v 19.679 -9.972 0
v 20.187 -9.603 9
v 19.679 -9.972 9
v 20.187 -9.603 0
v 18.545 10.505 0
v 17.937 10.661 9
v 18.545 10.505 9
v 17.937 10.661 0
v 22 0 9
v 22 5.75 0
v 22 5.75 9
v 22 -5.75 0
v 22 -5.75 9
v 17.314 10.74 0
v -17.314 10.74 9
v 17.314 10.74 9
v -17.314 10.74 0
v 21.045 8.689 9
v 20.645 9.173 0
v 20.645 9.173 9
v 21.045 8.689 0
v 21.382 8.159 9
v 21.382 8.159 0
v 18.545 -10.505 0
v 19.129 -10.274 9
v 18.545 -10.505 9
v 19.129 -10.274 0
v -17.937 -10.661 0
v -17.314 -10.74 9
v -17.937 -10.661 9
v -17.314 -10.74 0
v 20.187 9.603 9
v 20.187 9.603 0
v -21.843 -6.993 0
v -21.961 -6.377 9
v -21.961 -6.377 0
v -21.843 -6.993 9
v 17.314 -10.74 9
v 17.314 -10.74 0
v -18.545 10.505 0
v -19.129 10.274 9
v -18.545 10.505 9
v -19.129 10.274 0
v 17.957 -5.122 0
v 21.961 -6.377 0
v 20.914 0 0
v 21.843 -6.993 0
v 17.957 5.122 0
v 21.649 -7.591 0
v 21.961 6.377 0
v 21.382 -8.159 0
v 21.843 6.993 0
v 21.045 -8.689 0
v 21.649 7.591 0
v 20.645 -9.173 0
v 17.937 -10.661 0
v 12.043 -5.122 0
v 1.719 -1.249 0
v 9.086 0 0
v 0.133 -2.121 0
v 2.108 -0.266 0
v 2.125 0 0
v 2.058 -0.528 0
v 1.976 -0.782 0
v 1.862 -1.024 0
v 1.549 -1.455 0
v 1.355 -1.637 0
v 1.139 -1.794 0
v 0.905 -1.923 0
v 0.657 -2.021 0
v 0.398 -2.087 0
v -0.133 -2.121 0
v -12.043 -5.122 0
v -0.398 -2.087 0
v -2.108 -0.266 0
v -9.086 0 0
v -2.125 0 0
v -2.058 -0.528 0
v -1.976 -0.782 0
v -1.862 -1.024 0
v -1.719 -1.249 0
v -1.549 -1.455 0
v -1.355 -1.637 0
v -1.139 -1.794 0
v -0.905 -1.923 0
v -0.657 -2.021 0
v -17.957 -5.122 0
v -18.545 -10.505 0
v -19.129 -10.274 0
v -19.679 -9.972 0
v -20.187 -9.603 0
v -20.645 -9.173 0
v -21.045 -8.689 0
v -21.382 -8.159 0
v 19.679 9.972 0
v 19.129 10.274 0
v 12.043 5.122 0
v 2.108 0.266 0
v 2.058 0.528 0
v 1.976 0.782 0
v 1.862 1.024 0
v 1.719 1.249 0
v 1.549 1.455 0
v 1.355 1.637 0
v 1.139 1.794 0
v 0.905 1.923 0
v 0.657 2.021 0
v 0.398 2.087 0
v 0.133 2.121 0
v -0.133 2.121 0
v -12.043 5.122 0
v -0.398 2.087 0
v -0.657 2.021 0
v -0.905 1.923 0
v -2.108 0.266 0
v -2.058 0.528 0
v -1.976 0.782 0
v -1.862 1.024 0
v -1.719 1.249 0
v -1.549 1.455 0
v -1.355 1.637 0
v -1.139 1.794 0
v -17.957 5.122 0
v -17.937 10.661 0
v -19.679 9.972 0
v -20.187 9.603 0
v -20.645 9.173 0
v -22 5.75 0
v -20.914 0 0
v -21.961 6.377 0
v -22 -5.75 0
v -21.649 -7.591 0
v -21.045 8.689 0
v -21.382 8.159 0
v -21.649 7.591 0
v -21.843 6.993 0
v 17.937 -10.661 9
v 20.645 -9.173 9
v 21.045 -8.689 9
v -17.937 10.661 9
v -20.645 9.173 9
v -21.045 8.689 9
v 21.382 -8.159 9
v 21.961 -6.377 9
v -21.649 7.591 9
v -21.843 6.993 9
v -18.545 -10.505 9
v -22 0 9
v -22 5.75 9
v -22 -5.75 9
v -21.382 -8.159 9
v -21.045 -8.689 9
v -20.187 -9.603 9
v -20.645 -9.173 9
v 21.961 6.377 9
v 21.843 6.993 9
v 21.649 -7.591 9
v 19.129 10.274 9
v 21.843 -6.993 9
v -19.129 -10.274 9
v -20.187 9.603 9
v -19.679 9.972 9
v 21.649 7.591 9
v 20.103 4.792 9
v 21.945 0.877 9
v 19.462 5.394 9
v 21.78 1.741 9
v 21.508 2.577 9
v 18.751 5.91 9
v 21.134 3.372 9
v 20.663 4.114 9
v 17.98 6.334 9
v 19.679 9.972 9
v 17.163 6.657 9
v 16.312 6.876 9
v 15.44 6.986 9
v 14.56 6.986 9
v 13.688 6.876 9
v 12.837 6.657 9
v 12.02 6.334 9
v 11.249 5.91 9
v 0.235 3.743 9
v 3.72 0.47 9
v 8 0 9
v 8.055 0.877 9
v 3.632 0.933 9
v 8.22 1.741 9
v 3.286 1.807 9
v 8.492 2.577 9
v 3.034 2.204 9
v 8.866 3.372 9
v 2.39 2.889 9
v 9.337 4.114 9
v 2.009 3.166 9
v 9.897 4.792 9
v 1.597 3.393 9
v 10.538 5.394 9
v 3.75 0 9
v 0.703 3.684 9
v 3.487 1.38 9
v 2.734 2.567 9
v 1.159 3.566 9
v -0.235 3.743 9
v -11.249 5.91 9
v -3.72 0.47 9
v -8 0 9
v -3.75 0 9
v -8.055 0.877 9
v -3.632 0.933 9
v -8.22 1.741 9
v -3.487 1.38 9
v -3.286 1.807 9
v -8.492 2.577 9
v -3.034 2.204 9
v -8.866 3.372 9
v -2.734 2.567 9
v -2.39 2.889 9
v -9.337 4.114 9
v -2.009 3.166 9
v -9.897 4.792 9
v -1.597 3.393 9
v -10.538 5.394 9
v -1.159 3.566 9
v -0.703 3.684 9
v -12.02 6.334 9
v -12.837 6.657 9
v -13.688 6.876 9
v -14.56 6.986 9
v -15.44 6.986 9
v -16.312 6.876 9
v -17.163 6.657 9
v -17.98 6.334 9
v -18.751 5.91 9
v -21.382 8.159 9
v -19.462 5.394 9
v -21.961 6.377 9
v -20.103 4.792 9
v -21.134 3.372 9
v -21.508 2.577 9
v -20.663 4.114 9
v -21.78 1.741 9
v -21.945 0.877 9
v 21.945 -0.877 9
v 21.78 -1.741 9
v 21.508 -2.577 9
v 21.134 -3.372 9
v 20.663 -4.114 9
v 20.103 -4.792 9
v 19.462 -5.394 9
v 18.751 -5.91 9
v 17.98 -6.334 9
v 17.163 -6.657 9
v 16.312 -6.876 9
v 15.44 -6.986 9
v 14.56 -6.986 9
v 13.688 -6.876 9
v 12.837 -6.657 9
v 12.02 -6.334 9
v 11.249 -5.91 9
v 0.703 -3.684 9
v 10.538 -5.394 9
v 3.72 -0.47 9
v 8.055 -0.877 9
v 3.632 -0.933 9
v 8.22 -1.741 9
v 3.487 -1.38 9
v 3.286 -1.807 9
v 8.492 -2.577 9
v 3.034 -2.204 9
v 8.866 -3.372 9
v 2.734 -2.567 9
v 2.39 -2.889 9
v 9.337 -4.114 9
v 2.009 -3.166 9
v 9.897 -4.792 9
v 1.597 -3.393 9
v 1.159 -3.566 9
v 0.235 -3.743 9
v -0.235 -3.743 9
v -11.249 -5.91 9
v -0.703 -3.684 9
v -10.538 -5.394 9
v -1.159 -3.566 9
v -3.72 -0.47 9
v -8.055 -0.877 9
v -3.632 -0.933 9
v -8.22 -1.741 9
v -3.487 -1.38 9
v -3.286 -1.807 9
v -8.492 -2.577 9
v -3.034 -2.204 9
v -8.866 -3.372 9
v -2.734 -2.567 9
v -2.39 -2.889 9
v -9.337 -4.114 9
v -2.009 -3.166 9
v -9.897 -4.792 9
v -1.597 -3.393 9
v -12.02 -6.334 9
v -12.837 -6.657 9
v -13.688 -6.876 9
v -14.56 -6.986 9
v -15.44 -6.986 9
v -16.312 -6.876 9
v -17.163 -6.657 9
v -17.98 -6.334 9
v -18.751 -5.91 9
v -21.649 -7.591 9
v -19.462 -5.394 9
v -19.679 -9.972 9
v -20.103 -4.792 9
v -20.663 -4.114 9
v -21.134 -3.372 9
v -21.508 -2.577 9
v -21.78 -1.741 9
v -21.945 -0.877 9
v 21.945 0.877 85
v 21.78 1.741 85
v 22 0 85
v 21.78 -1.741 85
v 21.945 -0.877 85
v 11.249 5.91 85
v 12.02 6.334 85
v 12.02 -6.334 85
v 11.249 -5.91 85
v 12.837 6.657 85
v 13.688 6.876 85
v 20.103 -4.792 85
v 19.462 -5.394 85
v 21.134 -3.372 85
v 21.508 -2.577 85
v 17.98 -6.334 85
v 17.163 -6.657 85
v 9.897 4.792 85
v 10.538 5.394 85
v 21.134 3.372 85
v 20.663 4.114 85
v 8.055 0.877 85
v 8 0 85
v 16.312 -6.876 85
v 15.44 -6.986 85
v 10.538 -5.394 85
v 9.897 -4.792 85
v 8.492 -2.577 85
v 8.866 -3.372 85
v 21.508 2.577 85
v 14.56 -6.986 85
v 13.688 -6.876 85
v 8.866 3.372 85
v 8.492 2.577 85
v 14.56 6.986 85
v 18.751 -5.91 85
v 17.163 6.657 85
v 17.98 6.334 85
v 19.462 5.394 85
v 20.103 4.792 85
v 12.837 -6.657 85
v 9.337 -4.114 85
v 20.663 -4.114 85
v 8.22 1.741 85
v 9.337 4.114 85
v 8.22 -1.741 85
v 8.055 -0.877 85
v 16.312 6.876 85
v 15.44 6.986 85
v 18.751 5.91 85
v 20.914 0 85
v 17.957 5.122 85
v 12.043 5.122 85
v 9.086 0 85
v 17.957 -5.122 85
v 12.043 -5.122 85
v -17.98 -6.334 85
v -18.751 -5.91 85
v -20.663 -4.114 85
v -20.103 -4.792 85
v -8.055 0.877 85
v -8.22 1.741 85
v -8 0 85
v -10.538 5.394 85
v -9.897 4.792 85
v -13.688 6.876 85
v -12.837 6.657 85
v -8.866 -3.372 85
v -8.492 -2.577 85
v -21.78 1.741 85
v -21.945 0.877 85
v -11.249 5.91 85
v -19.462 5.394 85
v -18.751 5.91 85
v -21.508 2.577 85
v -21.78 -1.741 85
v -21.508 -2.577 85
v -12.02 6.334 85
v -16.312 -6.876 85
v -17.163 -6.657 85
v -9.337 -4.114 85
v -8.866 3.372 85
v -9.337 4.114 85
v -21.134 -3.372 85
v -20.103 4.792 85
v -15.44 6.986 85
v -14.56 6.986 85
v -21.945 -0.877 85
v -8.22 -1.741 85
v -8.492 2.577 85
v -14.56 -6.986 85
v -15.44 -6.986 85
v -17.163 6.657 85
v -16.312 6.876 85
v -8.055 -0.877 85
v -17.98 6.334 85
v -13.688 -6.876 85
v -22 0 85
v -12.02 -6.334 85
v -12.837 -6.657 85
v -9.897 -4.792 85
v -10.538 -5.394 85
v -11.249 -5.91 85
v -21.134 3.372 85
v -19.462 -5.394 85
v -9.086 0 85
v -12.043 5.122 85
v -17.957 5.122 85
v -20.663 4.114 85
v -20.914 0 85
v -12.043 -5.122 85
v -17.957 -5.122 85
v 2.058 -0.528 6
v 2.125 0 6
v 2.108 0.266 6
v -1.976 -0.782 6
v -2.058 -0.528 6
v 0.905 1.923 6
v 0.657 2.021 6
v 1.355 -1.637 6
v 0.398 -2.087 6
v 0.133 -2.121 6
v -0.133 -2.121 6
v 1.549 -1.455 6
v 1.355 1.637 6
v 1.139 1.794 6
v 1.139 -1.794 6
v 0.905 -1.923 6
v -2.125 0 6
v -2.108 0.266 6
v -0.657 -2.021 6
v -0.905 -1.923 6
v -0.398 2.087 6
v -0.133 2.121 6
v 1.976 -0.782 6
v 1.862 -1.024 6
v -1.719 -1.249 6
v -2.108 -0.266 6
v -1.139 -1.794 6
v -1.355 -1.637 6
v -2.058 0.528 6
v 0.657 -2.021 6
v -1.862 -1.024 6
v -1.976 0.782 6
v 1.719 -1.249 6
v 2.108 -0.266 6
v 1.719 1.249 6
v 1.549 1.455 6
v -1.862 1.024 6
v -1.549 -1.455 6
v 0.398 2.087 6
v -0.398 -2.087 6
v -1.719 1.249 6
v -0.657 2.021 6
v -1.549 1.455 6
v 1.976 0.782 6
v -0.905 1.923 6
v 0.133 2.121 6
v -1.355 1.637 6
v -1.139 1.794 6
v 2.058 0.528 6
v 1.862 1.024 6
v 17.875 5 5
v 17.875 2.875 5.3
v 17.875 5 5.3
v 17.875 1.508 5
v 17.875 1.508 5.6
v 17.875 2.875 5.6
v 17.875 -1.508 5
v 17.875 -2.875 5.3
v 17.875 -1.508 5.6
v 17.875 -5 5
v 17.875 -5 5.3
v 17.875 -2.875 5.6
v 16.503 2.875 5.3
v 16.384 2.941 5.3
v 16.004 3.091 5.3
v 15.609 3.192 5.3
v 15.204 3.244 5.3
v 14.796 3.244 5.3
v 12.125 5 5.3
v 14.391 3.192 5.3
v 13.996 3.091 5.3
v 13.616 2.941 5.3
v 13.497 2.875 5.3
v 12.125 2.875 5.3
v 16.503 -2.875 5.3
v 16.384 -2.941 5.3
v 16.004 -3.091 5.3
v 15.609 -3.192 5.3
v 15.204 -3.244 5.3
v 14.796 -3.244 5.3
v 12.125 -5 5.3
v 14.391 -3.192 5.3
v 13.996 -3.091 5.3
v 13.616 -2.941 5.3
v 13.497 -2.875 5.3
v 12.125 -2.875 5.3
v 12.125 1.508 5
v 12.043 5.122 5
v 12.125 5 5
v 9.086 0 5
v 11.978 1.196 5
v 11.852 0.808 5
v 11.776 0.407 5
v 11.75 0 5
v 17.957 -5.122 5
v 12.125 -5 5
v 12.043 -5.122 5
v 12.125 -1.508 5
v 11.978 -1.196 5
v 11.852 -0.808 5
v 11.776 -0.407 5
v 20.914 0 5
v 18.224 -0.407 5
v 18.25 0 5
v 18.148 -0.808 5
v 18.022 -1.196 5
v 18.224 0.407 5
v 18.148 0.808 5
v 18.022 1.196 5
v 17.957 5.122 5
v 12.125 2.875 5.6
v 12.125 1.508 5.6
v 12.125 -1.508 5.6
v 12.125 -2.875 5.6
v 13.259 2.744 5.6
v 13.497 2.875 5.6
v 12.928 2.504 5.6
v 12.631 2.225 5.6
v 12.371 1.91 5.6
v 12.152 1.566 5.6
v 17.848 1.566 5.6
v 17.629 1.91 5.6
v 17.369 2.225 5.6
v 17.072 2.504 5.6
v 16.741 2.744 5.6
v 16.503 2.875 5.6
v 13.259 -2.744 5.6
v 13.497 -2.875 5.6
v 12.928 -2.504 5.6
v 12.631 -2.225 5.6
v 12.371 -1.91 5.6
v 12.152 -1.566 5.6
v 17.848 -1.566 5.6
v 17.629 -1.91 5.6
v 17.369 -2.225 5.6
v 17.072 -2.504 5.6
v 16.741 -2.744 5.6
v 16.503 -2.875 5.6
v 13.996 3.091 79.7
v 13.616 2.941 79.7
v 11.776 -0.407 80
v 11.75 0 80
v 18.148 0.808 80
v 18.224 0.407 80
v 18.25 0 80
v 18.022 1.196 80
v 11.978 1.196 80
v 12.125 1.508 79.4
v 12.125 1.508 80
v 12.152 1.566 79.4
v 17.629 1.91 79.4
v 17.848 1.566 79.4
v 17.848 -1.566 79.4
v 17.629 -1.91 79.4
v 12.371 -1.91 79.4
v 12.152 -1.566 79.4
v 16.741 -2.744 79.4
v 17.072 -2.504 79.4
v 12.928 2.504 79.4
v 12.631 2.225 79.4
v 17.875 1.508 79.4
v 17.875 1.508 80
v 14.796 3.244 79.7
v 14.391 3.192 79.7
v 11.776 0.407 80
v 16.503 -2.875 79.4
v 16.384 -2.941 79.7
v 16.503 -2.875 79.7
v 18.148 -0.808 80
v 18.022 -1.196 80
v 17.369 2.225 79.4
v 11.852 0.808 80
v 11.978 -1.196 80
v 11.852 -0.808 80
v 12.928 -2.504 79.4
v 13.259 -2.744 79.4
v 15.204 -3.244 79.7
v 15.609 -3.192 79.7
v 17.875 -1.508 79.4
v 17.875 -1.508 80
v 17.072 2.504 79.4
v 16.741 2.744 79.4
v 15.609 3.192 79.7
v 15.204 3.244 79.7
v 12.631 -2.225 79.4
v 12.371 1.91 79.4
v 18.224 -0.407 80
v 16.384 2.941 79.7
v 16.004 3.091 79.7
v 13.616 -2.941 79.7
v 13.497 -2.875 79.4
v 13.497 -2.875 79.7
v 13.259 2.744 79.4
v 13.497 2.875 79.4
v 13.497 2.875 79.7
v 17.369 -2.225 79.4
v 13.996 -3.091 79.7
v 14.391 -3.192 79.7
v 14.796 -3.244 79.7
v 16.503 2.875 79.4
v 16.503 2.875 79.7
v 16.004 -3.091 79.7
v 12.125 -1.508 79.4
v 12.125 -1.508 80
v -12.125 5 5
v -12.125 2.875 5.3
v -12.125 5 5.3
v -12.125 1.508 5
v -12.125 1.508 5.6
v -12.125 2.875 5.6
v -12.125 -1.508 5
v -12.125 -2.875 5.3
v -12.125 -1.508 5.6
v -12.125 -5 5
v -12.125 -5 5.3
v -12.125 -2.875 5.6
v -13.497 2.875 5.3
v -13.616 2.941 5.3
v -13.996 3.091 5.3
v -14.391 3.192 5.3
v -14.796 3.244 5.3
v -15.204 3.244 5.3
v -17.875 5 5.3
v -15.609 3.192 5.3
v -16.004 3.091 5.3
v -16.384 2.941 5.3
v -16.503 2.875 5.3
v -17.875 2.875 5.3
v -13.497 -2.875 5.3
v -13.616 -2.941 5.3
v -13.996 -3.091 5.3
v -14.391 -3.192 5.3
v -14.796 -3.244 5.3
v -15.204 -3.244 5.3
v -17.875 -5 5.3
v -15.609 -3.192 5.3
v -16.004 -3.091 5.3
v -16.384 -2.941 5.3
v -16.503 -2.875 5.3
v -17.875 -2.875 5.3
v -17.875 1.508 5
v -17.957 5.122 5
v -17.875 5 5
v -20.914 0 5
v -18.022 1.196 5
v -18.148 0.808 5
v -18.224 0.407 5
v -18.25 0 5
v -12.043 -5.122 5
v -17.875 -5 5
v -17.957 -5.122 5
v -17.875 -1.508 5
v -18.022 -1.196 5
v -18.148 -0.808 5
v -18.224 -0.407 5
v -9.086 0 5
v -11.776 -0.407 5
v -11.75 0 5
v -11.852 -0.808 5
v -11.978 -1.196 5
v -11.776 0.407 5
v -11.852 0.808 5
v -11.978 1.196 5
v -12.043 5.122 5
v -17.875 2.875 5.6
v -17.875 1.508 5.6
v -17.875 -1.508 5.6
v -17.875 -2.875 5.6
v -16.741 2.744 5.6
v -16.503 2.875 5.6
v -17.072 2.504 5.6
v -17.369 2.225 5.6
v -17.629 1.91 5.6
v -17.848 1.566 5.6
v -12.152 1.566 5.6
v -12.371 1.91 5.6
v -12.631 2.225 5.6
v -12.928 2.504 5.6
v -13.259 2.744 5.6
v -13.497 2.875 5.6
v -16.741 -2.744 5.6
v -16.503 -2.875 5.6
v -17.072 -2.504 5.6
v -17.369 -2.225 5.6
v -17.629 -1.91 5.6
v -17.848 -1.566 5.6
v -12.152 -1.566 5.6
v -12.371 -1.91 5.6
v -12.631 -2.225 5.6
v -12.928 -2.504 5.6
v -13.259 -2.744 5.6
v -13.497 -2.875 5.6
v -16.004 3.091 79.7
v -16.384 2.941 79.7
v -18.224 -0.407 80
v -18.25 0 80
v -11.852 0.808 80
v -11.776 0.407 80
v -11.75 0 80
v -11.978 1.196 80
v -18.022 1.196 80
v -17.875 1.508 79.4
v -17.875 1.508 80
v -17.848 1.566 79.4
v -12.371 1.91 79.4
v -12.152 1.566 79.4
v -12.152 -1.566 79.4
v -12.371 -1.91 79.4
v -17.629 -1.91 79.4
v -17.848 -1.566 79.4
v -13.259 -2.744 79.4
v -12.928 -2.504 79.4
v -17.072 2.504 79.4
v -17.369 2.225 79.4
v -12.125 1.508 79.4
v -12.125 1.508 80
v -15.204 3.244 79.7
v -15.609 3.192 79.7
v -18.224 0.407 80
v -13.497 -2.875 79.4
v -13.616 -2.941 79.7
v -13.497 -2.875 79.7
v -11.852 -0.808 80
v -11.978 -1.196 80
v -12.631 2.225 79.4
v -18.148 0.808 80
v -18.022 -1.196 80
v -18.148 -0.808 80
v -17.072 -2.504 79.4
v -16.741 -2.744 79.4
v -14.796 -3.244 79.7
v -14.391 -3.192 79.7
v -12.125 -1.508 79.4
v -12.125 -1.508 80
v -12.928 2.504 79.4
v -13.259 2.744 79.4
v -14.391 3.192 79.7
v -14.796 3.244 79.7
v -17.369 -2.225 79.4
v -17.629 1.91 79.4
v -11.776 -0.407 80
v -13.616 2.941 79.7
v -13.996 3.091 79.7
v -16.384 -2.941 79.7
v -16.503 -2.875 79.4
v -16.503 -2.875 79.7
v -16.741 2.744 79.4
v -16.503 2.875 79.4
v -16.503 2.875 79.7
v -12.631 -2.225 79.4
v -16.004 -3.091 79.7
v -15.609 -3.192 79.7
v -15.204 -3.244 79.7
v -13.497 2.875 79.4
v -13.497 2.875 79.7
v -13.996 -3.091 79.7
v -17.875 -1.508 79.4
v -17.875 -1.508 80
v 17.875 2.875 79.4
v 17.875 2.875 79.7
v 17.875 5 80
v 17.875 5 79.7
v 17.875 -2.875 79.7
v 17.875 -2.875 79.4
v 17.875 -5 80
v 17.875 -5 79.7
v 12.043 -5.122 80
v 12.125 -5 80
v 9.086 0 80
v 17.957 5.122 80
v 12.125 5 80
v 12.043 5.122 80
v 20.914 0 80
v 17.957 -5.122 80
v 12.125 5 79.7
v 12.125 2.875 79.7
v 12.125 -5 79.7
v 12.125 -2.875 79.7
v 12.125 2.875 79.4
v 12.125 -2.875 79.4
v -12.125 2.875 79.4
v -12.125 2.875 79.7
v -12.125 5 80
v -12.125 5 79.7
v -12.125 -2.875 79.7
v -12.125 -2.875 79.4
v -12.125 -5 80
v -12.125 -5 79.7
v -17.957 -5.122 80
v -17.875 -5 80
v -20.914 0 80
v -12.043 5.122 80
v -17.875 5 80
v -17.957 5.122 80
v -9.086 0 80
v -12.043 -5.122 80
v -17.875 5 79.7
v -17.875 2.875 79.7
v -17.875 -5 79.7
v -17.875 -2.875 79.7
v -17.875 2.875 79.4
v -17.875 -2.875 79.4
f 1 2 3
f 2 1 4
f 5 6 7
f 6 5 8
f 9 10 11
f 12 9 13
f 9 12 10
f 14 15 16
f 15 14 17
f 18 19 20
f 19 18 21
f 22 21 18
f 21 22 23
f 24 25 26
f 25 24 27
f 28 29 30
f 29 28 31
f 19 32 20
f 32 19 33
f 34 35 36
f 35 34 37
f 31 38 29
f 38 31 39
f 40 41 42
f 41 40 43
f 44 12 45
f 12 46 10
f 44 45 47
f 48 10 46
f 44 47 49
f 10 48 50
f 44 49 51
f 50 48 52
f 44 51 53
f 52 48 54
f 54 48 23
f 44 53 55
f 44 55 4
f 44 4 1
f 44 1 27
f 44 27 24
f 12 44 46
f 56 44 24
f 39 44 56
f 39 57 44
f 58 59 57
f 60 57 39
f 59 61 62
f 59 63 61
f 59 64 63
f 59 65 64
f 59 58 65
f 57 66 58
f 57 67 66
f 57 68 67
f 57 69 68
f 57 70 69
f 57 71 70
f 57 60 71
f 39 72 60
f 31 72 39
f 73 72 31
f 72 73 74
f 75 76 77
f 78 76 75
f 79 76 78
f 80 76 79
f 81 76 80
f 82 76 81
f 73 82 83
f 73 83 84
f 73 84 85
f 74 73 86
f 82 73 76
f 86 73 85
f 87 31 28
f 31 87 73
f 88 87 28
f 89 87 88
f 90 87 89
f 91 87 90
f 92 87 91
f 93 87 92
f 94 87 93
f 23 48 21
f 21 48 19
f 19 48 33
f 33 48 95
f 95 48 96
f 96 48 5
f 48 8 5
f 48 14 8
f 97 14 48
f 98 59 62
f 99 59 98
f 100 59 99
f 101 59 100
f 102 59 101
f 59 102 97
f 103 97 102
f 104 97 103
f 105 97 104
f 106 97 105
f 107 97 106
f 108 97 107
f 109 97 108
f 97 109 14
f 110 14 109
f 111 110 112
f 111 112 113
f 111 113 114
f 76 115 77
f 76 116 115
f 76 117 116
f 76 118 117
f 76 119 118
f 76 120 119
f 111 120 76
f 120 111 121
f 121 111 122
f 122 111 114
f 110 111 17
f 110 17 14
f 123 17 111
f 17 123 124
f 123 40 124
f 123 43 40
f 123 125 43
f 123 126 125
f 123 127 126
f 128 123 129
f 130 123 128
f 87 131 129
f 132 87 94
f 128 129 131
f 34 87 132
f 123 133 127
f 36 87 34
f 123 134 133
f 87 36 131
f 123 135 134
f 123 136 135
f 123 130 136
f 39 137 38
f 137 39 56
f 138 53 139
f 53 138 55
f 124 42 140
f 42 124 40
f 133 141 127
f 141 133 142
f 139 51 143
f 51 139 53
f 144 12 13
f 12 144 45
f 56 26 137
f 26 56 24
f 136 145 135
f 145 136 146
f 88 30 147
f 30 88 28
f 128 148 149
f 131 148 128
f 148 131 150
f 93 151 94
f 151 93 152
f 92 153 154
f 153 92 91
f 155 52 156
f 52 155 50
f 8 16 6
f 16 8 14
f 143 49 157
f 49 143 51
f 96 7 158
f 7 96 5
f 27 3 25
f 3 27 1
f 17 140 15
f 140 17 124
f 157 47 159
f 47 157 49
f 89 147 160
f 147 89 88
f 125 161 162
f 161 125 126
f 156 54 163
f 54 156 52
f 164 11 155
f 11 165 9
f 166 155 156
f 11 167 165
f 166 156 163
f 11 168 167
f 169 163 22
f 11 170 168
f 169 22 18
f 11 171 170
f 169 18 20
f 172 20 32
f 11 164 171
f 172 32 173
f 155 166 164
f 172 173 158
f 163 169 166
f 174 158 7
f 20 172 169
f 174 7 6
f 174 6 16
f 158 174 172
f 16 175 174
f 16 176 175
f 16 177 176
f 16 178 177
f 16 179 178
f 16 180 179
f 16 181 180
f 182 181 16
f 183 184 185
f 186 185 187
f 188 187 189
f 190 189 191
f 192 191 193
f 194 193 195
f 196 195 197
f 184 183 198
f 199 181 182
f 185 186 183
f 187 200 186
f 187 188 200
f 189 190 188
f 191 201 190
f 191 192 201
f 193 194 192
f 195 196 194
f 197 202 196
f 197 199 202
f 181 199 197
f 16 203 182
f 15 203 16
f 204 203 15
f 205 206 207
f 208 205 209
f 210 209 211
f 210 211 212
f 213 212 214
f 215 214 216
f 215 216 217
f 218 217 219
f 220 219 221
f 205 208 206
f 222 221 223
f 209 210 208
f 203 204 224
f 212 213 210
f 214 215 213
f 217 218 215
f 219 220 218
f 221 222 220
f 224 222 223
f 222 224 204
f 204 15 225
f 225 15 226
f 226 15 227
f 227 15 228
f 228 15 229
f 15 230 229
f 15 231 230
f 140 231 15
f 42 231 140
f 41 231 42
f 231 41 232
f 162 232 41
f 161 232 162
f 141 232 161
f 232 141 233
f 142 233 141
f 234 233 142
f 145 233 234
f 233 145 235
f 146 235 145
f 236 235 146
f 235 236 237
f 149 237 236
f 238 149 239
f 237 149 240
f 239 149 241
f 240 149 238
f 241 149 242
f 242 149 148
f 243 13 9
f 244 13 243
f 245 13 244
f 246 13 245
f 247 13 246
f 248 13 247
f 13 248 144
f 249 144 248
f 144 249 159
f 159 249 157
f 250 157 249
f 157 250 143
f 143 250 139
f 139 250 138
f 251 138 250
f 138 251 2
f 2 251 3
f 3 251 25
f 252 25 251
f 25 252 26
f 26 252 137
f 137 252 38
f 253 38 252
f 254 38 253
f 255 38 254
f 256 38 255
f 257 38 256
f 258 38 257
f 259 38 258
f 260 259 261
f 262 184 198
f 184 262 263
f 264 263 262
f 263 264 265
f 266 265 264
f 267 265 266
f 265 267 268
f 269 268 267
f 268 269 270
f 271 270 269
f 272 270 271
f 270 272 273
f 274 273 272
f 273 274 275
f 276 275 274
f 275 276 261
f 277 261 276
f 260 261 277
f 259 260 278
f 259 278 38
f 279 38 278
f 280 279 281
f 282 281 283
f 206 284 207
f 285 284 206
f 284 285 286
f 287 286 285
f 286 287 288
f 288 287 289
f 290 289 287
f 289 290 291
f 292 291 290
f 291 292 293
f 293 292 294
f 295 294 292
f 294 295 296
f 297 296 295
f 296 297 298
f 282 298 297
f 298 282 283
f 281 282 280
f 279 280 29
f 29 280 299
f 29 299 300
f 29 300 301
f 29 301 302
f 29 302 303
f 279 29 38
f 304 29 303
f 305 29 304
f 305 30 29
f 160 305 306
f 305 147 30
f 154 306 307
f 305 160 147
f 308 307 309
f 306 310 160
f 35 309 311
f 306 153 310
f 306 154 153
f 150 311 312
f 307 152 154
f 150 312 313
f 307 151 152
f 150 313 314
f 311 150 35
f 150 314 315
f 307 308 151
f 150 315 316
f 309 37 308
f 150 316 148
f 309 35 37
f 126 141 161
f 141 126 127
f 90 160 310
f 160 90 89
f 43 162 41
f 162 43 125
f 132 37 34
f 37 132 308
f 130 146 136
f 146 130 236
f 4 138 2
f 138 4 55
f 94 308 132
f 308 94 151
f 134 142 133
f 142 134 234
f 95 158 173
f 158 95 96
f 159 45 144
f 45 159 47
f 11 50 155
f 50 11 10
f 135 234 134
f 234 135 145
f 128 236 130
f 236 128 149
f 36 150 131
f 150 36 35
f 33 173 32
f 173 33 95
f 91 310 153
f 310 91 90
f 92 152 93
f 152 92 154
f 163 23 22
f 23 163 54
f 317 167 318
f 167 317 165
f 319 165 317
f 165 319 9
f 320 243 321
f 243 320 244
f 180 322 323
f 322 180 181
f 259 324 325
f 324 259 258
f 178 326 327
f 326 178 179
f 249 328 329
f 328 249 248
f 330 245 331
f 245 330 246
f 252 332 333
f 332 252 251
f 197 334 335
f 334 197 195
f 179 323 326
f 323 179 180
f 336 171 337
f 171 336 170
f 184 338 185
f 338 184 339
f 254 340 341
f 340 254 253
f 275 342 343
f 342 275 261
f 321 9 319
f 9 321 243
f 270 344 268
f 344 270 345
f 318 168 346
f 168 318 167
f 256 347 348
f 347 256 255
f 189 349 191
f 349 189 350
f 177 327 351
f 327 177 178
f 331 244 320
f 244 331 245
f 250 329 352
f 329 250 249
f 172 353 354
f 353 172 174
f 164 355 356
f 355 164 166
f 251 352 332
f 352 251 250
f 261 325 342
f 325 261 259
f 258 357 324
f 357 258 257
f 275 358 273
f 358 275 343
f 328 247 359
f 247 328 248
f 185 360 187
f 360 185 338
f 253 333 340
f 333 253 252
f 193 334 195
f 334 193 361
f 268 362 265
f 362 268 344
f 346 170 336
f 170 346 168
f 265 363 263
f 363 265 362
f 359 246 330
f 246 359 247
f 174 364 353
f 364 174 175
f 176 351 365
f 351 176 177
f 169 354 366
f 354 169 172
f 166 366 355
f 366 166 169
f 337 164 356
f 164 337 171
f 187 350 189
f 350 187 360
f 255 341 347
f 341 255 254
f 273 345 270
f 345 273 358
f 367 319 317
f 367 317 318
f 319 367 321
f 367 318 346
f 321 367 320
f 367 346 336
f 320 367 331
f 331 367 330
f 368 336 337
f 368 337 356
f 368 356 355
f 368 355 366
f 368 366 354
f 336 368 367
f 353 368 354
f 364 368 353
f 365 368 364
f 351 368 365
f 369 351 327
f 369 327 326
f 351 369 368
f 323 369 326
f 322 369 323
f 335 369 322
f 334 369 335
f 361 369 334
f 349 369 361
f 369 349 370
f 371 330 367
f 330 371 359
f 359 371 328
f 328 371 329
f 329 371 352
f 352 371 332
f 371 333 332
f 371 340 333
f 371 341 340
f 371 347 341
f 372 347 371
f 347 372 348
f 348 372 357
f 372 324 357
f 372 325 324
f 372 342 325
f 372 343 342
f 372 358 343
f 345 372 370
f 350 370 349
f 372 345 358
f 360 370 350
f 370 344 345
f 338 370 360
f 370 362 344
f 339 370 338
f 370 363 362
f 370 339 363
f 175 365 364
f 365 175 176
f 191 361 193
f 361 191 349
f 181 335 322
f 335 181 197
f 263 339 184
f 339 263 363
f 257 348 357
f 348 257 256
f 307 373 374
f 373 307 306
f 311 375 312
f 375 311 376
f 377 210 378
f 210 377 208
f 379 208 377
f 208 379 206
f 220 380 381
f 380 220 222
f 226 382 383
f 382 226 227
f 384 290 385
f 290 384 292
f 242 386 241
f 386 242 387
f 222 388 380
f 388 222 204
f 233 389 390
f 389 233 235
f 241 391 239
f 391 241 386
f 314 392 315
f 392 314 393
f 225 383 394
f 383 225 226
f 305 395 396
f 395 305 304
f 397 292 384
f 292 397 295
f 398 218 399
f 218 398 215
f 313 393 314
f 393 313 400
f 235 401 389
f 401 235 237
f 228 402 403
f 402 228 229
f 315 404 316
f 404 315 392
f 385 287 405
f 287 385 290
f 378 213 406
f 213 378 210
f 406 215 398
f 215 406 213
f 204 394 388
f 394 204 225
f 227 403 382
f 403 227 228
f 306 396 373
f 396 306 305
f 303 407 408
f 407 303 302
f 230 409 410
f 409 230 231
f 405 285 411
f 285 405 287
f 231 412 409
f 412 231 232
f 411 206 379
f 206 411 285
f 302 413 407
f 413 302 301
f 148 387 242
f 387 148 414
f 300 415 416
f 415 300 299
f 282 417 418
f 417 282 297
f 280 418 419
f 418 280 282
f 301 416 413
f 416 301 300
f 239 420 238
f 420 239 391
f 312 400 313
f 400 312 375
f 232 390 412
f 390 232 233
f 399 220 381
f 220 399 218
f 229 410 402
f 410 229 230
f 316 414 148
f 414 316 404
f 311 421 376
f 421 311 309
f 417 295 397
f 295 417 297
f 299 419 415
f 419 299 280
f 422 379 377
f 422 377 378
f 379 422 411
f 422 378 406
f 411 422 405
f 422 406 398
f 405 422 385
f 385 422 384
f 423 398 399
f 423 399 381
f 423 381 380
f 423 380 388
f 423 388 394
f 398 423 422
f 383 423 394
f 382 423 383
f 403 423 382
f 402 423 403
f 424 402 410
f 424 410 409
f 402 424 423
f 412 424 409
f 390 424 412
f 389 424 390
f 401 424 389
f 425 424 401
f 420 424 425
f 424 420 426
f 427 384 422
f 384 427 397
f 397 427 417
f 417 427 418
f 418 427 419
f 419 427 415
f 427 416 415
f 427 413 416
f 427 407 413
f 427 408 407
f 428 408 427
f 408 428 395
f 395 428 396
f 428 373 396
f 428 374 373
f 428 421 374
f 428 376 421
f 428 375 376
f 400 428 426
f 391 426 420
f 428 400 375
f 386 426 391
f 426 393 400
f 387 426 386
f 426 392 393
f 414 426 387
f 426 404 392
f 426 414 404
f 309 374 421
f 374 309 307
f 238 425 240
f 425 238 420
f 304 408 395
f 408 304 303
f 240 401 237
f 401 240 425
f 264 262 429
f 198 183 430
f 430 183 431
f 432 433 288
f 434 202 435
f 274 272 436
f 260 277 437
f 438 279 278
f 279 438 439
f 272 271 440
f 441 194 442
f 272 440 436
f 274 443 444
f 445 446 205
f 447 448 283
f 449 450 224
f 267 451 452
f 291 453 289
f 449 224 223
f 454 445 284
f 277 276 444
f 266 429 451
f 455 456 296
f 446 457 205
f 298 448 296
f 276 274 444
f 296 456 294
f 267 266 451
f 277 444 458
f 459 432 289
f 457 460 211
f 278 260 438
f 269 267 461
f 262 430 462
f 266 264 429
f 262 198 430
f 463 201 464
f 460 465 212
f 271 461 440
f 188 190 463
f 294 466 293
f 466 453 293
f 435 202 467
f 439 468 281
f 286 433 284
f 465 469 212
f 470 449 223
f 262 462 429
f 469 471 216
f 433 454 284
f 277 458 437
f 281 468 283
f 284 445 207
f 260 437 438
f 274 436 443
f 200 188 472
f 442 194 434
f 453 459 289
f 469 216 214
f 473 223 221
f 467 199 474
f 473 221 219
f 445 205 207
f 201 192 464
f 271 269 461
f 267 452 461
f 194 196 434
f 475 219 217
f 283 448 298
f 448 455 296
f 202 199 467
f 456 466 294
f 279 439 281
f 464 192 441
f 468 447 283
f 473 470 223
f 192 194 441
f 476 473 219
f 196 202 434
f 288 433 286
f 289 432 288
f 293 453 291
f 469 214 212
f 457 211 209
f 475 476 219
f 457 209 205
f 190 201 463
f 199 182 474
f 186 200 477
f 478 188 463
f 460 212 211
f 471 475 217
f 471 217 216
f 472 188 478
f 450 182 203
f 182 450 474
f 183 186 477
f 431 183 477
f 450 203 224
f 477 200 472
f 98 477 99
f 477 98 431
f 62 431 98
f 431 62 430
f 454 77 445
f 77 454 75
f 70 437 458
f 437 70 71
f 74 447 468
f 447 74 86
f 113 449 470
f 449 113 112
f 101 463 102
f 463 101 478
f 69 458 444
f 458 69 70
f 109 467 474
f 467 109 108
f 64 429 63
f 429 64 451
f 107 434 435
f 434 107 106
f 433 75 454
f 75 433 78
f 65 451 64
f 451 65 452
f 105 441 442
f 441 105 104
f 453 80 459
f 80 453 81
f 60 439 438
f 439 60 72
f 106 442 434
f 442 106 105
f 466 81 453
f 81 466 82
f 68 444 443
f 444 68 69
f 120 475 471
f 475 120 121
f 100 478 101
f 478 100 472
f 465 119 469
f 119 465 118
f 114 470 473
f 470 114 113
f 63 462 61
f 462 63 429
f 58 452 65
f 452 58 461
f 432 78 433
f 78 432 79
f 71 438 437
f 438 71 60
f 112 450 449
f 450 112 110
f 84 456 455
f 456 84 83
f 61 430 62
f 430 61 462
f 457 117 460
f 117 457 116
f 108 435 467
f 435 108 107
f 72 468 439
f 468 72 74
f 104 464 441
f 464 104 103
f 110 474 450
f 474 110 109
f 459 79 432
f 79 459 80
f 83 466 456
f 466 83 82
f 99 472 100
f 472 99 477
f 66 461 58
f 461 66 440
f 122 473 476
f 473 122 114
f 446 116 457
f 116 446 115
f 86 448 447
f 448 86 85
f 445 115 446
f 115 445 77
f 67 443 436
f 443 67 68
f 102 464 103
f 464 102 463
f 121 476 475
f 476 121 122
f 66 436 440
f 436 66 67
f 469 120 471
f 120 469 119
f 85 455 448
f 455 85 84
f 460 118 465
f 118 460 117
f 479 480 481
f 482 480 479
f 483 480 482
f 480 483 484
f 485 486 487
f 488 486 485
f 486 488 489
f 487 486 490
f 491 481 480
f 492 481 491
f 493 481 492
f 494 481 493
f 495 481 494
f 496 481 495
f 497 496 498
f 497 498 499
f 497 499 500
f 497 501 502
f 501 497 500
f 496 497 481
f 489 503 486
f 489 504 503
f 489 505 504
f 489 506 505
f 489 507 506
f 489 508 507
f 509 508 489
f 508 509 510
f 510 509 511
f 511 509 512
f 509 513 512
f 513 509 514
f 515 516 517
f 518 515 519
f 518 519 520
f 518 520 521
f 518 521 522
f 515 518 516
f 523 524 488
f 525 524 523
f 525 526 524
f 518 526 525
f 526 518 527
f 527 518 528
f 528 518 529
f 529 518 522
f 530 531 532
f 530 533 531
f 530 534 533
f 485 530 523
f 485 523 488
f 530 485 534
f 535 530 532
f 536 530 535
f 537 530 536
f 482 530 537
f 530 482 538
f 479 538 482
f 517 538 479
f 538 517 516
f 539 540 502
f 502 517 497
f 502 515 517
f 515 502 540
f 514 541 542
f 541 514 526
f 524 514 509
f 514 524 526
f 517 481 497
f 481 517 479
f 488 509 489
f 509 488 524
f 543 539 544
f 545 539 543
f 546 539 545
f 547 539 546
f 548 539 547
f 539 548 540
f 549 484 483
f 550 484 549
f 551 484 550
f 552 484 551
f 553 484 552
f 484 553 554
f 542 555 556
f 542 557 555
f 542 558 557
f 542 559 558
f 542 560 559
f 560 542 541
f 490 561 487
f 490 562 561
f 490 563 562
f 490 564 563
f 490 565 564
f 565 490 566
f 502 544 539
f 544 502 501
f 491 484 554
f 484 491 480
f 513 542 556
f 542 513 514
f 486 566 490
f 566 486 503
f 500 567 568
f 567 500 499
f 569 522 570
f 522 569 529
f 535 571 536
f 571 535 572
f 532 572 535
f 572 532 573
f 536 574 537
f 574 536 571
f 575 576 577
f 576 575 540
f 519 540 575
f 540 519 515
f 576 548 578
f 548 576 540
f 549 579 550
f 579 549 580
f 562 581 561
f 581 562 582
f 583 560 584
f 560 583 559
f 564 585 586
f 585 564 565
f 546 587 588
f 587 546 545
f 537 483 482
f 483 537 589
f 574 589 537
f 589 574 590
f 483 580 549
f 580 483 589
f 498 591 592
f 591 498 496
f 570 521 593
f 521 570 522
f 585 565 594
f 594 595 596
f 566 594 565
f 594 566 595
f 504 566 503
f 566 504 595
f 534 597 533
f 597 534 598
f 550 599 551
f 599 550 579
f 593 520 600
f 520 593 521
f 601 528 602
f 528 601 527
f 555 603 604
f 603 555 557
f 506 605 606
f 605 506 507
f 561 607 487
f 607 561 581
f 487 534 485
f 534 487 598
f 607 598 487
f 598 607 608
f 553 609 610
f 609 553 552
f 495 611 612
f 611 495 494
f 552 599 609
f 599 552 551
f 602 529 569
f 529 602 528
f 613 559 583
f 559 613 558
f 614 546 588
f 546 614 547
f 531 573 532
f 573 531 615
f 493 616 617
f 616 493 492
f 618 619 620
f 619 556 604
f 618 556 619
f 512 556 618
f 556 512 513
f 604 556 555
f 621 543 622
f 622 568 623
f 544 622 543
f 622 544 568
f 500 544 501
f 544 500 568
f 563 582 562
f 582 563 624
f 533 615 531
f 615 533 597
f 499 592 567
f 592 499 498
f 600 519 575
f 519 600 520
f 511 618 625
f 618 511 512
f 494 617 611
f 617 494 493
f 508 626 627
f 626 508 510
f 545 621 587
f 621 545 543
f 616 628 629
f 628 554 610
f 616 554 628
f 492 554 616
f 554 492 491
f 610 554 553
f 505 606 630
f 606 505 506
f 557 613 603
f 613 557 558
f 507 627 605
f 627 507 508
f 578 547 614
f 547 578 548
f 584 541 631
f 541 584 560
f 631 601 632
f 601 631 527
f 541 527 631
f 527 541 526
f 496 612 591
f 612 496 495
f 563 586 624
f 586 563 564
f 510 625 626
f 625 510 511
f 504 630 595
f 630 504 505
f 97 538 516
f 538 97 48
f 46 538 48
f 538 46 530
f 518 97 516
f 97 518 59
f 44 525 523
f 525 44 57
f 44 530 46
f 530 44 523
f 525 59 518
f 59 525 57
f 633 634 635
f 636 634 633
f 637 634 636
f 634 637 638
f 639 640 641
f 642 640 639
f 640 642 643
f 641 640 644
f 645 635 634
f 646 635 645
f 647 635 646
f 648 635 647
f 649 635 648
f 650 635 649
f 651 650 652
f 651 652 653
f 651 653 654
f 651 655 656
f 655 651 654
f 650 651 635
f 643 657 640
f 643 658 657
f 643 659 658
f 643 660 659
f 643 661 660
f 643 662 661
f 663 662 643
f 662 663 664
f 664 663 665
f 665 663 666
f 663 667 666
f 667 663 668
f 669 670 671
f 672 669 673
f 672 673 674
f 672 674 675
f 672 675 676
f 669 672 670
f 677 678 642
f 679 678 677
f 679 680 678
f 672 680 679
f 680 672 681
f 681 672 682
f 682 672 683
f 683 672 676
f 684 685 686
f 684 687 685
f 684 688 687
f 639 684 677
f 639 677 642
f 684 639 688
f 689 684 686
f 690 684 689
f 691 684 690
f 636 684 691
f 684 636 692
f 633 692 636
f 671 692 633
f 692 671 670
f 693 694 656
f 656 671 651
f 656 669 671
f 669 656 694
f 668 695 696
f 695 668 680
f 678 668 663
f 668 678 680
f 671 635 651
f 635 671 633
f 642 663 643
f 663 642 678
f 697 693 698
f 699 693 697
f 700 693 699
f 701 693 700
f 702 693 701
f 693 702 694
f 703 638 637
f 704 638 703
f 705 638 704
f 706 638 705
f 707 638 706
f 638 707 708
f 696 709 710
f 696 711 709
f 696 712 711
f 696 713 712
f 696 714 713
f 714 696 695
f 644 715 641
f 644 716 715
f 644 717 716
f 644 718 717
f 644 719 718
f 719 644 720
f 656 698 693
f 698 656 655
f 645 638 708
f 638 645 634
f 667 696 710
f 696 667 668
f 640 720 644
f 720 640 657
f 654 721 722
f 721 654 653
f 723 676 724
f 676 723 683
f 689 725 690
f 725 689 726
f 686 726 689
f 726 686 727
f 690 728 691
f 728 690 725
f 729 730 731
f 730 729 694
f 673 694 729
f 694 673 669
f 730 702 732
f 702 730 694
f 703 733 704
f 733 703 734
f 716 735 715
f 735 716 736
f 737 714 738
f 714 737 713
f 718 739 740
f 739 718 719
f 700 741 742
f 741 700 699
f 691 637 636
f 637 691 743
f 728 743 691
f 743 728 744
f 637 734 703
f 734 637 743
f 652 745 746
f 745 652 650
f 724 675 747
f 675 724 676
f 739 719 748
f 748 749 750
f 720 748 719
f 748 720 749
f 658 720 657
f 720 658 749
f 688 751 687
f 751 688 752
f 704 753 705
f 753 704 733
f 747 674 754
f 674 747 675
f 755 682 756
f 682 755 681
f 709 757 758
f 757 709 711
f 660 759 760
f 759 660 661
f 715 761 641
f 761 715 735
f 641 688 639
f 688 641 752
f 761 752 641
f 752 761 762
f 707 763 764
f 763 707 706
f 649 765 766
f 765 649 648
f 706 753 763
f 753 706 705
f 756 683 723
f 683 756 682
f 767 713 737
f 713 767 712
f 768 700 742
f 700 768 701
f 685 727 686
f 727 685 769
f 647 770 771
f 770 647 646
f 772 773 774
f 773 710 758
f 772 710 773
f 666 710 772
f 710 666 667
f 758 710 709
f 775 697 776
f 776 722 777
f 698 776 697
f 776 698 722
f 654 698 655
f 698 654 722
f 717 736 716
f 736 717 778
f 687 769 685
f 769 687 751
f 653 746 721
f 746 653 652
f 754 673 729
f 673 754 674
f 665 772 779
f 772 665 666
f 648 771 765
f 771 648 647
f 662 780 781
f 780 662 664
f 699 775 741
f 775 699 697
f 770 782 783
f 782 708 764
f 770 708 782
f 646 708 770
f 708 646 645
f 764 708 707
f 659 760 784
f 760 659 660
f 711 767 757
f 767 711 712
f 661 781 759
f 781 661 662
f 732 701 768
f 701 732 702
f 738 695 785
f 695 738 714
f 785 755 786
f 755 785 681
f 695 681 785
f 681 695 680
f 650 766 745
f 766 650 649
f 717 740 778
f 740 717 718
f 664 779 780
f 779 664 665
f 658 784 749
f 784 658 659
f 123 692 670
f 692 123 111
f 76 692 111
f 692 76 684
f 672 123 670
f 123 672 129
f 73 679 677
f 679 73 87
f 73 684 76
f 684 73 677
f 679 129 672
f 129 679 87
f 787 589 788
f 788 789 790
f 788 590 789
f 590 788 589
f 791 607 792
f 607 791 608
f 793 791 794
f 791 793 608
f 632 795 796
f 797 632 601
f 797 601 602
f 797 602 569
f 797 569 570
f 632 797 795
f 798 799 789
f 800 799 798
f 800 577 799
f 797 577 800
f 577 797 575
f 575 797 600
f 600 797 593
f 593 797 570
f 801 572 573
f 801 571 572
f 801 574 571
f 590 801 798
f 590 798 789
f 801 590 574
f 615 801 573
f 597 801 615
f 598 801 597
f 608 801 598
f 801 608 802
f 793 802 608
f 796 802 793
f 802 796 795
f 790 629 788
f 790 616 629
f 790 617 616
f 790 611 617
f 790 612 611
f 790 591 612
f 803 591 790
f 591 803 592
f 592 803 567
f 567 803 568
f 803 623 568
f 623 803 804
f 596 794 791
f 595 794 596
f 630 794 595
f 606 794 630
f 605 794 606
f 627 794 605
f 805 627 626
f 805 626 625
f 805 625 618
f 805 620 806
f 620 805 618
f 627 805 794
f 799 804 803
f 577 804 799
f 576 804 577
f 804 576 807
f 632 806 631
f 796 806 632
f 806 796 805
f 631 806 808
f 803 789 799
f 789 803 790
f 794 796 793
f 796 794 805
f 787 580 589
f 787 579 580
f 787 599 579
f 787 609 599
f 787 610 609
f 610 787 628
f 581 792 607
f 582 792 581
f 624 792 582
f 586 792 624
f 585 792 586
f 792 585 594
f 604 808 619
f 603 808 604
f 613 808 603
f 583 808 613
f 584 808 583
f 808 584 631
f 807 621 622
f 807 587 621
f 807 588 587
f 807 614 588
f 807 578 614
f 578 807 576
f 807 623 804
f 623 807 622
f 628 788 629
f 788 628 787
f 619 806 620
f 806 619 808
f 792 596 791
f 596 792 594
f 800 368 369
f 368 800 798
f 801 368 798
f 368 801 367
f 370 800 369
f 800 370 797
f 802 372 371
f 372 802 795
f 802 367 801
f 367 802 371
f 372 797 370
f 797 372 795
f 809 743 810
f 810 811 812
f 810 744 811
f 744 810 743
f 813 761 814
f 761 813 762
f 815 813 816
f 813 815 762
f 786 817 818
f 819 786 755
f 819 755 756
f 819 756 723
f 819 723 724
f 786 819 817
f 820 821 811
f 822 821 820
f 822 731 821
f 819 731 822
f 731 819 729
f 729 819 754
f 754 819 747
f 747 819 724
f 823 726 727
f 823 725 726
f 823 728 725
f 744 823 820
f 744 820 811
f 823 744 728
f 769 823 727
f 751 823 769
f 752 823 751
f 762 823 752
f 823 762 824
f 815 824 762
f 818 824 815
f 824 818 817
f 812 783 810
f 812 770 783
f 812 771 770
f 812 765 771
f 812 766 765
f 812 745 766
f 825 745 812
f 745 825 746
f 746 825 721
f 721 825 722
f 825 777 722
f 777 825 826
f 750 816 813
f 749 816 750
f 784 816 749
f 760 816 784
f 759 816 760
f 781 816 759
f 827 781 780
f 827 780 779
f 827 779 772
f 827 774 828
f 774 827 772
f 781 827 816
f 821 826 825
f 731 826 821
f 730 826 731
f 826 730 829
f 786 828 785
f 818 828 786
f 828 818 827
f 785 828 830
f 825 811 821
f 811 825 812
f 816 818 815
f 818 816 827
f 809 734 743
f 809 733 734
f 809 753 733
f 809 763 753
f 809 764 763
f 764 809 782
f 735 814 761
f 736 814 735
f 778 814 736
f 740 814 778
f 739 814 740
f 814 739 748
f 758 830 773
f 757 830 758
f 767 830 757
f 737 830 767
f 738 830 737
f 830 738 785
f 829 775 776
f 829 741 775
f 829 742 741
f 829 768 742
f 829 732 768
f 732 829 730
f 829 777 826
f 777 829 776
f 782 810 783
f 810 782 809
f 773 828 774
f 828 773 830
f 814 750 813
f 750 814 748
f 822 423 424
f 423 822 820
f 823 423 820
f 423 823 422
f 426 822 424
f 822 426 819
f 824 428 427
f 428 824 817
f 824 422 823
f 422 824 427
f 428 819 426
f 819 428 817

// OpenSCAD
$fn = 50;


difference() {
	union() {
		hull() {
			translate(v = [-17.0000000000, 5.7500000000, 0]) {
				cylinder(h = 9, r = 5);
			}
			translate(v = [17.0000000000, 5.7500000000, 0]) {
				cylinder(h = 9, r = 5);
			}
			translate(v = [-17.0000000000, -5.7500000000, 0]) {
				cylinder(h = 9, r = 5);
			}
			translate(v = [17.0000000000, -5.7500000000, 0]) {
				cylinder(h = 9, r = 5);
			}
		}
		translate(v = [15.0000000000, 0, 0.0000000000]) {
			cylinder(h = 85, r = 7.0000000000);
		}
		translate(v = [-15.0000000000, 0, 0.0000000000]) {
			cylinder(h = 85, r = 7.0000000000);
		}
		translate(v = [15.0000000000, 0, 79.0000000000]) {
			cylinder(h = 6, r = 7.0000000000);
		}
		translate(v = [-15.0000000000, 0, 79.0000000000]) {
			cylinder(h = 6, r = 7.0000000000);
		}
	}
	union() {
		translate(v = [0, 0, 9]) {
			rotate(a = [0, 0, 0]) {
				difference() {
					union() {
						#translate(v = [0, 0, -80.0000000000]) {
							cylinder(h = 80, r = 2.0000000000);
						}
						#translate(v = [0, 0, -3]) {
							cylinder(h = 3, r1 = 2.1250000000, r2 = 3.7500000000);
						}
						#translate(v = [0, 0, -80.0000000000]) {
							cylinder(h = 80, r = 2.1250000000);
						}
						#translate(v = [0, 0, -80.0000000000]) {
							cylinder(h = 80, r = 2.0000000000);
						}
					}
					union();
				}
			}
		}
		translate(v = [15.0000000000, 0, 0]) {
			rotate(a = [0, 0, 0]) {
				difference() {
					union() {
						#translate(v = [-2.8750000000, -5.0000000000, -0.3000000000]) {
							cube(size = [5.7500000000, 10, 0.3000000000]);
						}
						#translate(v = [-2.8750000000, -2.8750000000, -0.6000000000]) {
							cube(size = [5.7500000000, 5.7500000000, 0.3000000000]);
						}
						#translate(v = [-2.8750000000, -5.0000000000, 5]) {
							cube(size = [5.7500000000, 10, 0.3000000000]);
						}
						#translate(v = [-2.8750000000, -2.8750000000, 5.3000000000]) {
							cube(size = [5.7500000000, 5.7500000000, 0.3000000000]);
						}
						#translate(v = [0, 0, -100.0000000000]) {
							cylinder(h = 200, r = 3.2500000000);
						}
						#linear_extrude(height = 5) {
							polygon(points = [[5.9142500000, 0.0000000000], [2.9571250000, 5.1218907443], [-2.9571250000, 5.1218907443], [-5.9142500000, 0.0000000000], [-2.9571250000, -5.1218907443], [2.9571250000, -5.1218907443]]);
						}
						#translate(v = [-2.8750000000, -5.0000000000, -0.3000000000]) {
							cube(size = [5.7500000000, 10, 0.3000000000]);
						}
						#translate(v = [-2.8750000000, -2.8750000000, -0.6000000000]) {
							cube(size = [5.7500000000, 5.7500000000, 0.3000000000]);
						}
						#translate(v = [-2.8750000000, -5.0000000000, 5]) {
							cube(size = [5.7500000000, 10, 0.3000000000]);
						}
						#translate(v = [-2.8750000000, -2.8750000000, 5.3000000000]) {
							cube(size = [5.7500000000, 5.7500000000, 0.3000000000]);
						}
						#translate(v = [0, 0, -100.0000000000]) {
							cylinder(h = 200, r = 3.2500000000);
						}
						#translate(v = [-2.8750000000, -5.0000000000, -0.3000000000]) {
							cube(size = [5.7500000000, 10, 0.3000000000]);
						}
						#translate(v = [-2.8750000000, -2.8750000000, -0.6000000000]) {
							cube(size = [5.7500000000, 5.7500000000, 0.3000000000]);
						}
						#translate(v = [-2.8750000000, -5.0000000000, 5]) {
							cube(size = [5.7500000000, 10, 0.3000000000]);
						}
						#translate(v = [-2.8750000000, -2.8750000000, 5.3000000000]) {
							cube(size = [5.7500000000, 5.7500000000, 0.3000000000]);
						}
						#translate(v = [0, 0, -100.0000000000]) {
							cylinder(h = 200, r = 3.2500000000);
						}
					}
					union();
				}
			}
		}
		translate(v = [-15.0000000000, 0, 0]) {
			rotate(a = [0, 0, 0]) {
				difference() {
					union() {
						#translate(v = [-2.8750000000, -5.0000000000, -0.3000000000]) {
							cube(size = [5.7500000000, 10, 0.3000000000]);
						}
						#translate(v = [-2.8750000000, -2.8750000000, -0.6000000000]) {
							cube(size = [5.7500000000, 5.7500000000, 0.3000000000]);
						}
						#translate(v = [-2.8750000000, -5.0000000000, 5]) {
							cube(size = [5.7500000000, 10, 0.3000000000]);
						}
						#translate(v = [-2.8750000000, -2.8750000000, 5.3000000000]) {
							cube(size = [5.7500000000, 5.7500000000, 0.3000000000]);
						}
						#translate(v = [0, 0, -100.0000000000]) {
							cylinder(h = 200, r = 3.2500000000);
						}
						#linear_extrude(height = 5) {
							polygon(points = [[5.9142500000, 0.0000000000], [2.9571250000, 5.1218907443], [-2.9571250000, 5.1218907443], [-5.9142500000, 0.0000000000], [-2.9571250000, -5.1218907443], [2.9571250000, -5.1218907443]]);
						}
						#translate(v = [-2.8750000000, -5.0000000000, -0.3000000000]) {
							cube(size = [5.7500000000, 10, 0.3000000000]);
						}
						#translate(v = [-2.8750000000, -2.8750000000, -0.6000000000]) {
							cube(size = [5.7500000000, 5.7500000000, 0.3000000000]);
						}
						#translate(v = [-2.8750000000, -5.0000000000, 5]) {
							cube(size = [5.7500000000, 10, 0.3000000000]);
						}
						#translate(v = [-2.8750000000, -2.8750000000, 5.3000000000]) {
							cube(size = [5.7500000000, 5.7500000000, 0.3000000000]);
						}
						#translate(v = [0, 0, -100.0000000000]) {
							cylinder(h = 200, r = 3.2500000000);
						}
						#translate(v = [-2.8750000000, -5.0000000000, -0.3000000000]) {
							cube(size = [5.7500000000, 10, 0.3000000000]);
						}
						#translate(v = [-2.8750000000, -2.8750000000, -0.6000000000]) {
							cube(size = [5.7500000000, 5.7500000000, 0.3000000000]);
						}
						#translate(v = [-2.8750000000, -5.0000000000, 5]) {
							cube(size = [5.7500000000, 10, 0.3000000000]);
						}
						#translate(v = [-2.8750000000, -2.8750000000, 5.3000000000]) {
							cube(size = [5.7500000000, 5.7500000000, 0.3000000000]);
						}
						#translate(v = [0, 0, -100.0000000000]) {
							cylinder(h = 200, r = 3.2500000000);
						}
					}
					union();
				}
			}
		}
		translate(v = [15.0000000000, 0, 85]) {
			rotate(a = [0, 0, 0]) {
				difference() {
					union() {
						#translate(v = [-2.8750000000, -5.0000000000, -5.3000000000]) {
							cube(size = [5.7500000000, 10, 0.3000000000]);
						}
						#translate(v = [-2.8750000000, -2.8750000000, -5.6000000000]) {
							cube(size = [5.7500000000, 5.7500000000, 0.3000000000]);
						}
						#translate(v = [-2.8750000000, -5.0000000000, 0]) {
							cube(size = [5.7500000000, 10, 0.3000000000]);
						}
						#translate(v = [-2.8750000000, -2.8750000000, 0.3000000000]) {
							cube(size = [5.7500000000, 5.7500000000, 0.3000000000]);
						}
						#translate(v = [0, 0, -100.0000000000]) {
							cylinder(h = 200, r = 3.2500000000);
						}
						translate(v = [0, 0, -5]) {
							#linear_extrude(height = 5) {
								polygon(points = [[5.9142500000, 0.0000000000], [2.9571250000, 5.1218907443], [-2.9571250000, 5.1218907443], [-5.9142500000, 0.0000000000], [-2.9571250000, -5.1218907443], [2.9571250000, -5.1218907443]]);
							}
						}
						#translate(v = [-2.8750000000, -5.0000000000, -5.3000000000]) {
							cube(size = [5.7500000000, 10, 0.3000000000]);
						}
						#translate(v = [-2.8750000000, -2.8750000000, -5.6000000000]) {
							cube(size = [5.7500000000, 5.7500000000, 0.3000000000]);
						}
						#translate(v = [-2.8750000000, -5.0000000000, 0]) {
							cube(size = [5.7500000000, 10, 0.3000000000]);
						}
						#translate(v = [-2.8750000000, -2.8750000000, 0.3000000000]) {
							cube(size = [5.7500000000, 5.7500000000, 0.3000000000]);
						}
						#translate(v = [0, 0, -100.0000000000]) {
							cylinder(h = 200, r = 3.2500000000);
						}
						#translate(v = [-2.8750000000, -5.0000000000, -5.3000000000]) {
							cube(size = [5.7500000000, 10, 0.3000000000]);
						}
						#translate(v = [-2.8750000000, -2.8750000000, -5.6000000000]) {
							cube(size = [5.7500000000, 5.7500000000, 0.3000000000]);
						}
						#translate(v = [-2.8750000000, -5.0000000000, 0]) {
							cube(size = [5.7500000000, 10, 0.3000000000]);
						}
						#translate(v = [-2.8750000000, -2.8750000000, 0.3000000000]) {
							cube(size = [5.7500000000, 5.7500000000, 0.3000000000]);
						}
						#translate(v = [0, 0, -100.0000000000]) {
							cylinder(h = 200, r = 3.2500000000);
						}
					}
					union();
				}
			}
		}
		translate(v = [-15.0000000000, 0, 85]) {
			rotate(a = [0, 0, 0]) {
				difference() {
					union() {
						#translate(v = [-2.8750000000, -5.0000000000, -5.3000000000]) {
							cube(size = [5.7500000000, 10, 0.3000000000]);
						}
						#translate(v = [-2.8750000000, -2.8750000000, -5.6000000000]) {
							cube(size = [5.7500000000, 5.7500000000, 0.3000000000]);
						}
						#translate(v = [-2.8750000000, -5.0000000000, 0]) {
							cube(size = [5.7500000000, 10, 0.3000000000]);
						}
						#translate(v = [-2.8750000000, -2.8750000000, 0.3000000000]) {
							cube(size = [5.7500000000, 5.7500000000, 0.3000000000]);
						}
						#translate(v = [0, 0, -100.0000000000]) {
							cylinder(h = 200, r = 3.2500000000);
						}
						translate(v = [0, 0, -5]) {
							#linear_extrude(height = 5) {
								polygon(points = [[5.9142500000, 0.0000000000], [2.9571250000, 5.1218907443], [-2.9571250000, 5.1218907443], [-5.9142500000, 0.0000000000], [-2.9571250000, -5.1218907443], [2.9571250000, -5.1218907443]]);
							}
						}
						#translate(v = [-2.8750000000, -5.0000000000, -5.3000000000]) {
							cube(size = [5.7500000000, 10, 0.3000000000]);
						}
						#translate(v = [-2.8750000000, -2.8750000000, -5.6000000000]) {
							cube(size = [5.7500000000, 5.7500000000, 0.3000000000]);
						}
						#translate(v = [-2.8750000000, -5.0000000000, 0]) {
							cube(size = [5.7500000000, 10, 0.3000000000]);
						}
						#translate(v = [-2.8750000000, -2.8750000000, 0.3000000000]) {
							cube(size = [5.7500000000, 5.7500000000, 0.3000000000]);
						}
						#translate(v = [0, 0, -100.0000000000]) {
							cylinder(h = 200, r = 3.2500000000);
						}
						#translate(v = [-2.8750000000, -5.0000000000, -5.3000000000]) {
							cube(size = [5.7500000000, 10, 0.3000000000]);
						}
						#translate(v = [-2.8750000000, -2.8750000000, -5.6000000000]) {
							cube(size = [5.7500000000, 5.7500000000, 0.3000000000]);
						}
						#translate(v = [-2.8750000000, -5.0000000000, 0]) {
							cube(size = [5.7500000000, 10, 0.3000000000]);
						}
						#translate(v = [-2.8750000000, -2.8750000000, 0.3000000000]) {
							cube(size = [5.7500000000, 5.7500000000, 0.3000000000]);
						}
						#translate(v = [0, 0, -100.0000000000]) {
							cylinder(h = 200, r = 3.2500000000);
						}
					}
					union();
				}
			}
		}
	}
}
